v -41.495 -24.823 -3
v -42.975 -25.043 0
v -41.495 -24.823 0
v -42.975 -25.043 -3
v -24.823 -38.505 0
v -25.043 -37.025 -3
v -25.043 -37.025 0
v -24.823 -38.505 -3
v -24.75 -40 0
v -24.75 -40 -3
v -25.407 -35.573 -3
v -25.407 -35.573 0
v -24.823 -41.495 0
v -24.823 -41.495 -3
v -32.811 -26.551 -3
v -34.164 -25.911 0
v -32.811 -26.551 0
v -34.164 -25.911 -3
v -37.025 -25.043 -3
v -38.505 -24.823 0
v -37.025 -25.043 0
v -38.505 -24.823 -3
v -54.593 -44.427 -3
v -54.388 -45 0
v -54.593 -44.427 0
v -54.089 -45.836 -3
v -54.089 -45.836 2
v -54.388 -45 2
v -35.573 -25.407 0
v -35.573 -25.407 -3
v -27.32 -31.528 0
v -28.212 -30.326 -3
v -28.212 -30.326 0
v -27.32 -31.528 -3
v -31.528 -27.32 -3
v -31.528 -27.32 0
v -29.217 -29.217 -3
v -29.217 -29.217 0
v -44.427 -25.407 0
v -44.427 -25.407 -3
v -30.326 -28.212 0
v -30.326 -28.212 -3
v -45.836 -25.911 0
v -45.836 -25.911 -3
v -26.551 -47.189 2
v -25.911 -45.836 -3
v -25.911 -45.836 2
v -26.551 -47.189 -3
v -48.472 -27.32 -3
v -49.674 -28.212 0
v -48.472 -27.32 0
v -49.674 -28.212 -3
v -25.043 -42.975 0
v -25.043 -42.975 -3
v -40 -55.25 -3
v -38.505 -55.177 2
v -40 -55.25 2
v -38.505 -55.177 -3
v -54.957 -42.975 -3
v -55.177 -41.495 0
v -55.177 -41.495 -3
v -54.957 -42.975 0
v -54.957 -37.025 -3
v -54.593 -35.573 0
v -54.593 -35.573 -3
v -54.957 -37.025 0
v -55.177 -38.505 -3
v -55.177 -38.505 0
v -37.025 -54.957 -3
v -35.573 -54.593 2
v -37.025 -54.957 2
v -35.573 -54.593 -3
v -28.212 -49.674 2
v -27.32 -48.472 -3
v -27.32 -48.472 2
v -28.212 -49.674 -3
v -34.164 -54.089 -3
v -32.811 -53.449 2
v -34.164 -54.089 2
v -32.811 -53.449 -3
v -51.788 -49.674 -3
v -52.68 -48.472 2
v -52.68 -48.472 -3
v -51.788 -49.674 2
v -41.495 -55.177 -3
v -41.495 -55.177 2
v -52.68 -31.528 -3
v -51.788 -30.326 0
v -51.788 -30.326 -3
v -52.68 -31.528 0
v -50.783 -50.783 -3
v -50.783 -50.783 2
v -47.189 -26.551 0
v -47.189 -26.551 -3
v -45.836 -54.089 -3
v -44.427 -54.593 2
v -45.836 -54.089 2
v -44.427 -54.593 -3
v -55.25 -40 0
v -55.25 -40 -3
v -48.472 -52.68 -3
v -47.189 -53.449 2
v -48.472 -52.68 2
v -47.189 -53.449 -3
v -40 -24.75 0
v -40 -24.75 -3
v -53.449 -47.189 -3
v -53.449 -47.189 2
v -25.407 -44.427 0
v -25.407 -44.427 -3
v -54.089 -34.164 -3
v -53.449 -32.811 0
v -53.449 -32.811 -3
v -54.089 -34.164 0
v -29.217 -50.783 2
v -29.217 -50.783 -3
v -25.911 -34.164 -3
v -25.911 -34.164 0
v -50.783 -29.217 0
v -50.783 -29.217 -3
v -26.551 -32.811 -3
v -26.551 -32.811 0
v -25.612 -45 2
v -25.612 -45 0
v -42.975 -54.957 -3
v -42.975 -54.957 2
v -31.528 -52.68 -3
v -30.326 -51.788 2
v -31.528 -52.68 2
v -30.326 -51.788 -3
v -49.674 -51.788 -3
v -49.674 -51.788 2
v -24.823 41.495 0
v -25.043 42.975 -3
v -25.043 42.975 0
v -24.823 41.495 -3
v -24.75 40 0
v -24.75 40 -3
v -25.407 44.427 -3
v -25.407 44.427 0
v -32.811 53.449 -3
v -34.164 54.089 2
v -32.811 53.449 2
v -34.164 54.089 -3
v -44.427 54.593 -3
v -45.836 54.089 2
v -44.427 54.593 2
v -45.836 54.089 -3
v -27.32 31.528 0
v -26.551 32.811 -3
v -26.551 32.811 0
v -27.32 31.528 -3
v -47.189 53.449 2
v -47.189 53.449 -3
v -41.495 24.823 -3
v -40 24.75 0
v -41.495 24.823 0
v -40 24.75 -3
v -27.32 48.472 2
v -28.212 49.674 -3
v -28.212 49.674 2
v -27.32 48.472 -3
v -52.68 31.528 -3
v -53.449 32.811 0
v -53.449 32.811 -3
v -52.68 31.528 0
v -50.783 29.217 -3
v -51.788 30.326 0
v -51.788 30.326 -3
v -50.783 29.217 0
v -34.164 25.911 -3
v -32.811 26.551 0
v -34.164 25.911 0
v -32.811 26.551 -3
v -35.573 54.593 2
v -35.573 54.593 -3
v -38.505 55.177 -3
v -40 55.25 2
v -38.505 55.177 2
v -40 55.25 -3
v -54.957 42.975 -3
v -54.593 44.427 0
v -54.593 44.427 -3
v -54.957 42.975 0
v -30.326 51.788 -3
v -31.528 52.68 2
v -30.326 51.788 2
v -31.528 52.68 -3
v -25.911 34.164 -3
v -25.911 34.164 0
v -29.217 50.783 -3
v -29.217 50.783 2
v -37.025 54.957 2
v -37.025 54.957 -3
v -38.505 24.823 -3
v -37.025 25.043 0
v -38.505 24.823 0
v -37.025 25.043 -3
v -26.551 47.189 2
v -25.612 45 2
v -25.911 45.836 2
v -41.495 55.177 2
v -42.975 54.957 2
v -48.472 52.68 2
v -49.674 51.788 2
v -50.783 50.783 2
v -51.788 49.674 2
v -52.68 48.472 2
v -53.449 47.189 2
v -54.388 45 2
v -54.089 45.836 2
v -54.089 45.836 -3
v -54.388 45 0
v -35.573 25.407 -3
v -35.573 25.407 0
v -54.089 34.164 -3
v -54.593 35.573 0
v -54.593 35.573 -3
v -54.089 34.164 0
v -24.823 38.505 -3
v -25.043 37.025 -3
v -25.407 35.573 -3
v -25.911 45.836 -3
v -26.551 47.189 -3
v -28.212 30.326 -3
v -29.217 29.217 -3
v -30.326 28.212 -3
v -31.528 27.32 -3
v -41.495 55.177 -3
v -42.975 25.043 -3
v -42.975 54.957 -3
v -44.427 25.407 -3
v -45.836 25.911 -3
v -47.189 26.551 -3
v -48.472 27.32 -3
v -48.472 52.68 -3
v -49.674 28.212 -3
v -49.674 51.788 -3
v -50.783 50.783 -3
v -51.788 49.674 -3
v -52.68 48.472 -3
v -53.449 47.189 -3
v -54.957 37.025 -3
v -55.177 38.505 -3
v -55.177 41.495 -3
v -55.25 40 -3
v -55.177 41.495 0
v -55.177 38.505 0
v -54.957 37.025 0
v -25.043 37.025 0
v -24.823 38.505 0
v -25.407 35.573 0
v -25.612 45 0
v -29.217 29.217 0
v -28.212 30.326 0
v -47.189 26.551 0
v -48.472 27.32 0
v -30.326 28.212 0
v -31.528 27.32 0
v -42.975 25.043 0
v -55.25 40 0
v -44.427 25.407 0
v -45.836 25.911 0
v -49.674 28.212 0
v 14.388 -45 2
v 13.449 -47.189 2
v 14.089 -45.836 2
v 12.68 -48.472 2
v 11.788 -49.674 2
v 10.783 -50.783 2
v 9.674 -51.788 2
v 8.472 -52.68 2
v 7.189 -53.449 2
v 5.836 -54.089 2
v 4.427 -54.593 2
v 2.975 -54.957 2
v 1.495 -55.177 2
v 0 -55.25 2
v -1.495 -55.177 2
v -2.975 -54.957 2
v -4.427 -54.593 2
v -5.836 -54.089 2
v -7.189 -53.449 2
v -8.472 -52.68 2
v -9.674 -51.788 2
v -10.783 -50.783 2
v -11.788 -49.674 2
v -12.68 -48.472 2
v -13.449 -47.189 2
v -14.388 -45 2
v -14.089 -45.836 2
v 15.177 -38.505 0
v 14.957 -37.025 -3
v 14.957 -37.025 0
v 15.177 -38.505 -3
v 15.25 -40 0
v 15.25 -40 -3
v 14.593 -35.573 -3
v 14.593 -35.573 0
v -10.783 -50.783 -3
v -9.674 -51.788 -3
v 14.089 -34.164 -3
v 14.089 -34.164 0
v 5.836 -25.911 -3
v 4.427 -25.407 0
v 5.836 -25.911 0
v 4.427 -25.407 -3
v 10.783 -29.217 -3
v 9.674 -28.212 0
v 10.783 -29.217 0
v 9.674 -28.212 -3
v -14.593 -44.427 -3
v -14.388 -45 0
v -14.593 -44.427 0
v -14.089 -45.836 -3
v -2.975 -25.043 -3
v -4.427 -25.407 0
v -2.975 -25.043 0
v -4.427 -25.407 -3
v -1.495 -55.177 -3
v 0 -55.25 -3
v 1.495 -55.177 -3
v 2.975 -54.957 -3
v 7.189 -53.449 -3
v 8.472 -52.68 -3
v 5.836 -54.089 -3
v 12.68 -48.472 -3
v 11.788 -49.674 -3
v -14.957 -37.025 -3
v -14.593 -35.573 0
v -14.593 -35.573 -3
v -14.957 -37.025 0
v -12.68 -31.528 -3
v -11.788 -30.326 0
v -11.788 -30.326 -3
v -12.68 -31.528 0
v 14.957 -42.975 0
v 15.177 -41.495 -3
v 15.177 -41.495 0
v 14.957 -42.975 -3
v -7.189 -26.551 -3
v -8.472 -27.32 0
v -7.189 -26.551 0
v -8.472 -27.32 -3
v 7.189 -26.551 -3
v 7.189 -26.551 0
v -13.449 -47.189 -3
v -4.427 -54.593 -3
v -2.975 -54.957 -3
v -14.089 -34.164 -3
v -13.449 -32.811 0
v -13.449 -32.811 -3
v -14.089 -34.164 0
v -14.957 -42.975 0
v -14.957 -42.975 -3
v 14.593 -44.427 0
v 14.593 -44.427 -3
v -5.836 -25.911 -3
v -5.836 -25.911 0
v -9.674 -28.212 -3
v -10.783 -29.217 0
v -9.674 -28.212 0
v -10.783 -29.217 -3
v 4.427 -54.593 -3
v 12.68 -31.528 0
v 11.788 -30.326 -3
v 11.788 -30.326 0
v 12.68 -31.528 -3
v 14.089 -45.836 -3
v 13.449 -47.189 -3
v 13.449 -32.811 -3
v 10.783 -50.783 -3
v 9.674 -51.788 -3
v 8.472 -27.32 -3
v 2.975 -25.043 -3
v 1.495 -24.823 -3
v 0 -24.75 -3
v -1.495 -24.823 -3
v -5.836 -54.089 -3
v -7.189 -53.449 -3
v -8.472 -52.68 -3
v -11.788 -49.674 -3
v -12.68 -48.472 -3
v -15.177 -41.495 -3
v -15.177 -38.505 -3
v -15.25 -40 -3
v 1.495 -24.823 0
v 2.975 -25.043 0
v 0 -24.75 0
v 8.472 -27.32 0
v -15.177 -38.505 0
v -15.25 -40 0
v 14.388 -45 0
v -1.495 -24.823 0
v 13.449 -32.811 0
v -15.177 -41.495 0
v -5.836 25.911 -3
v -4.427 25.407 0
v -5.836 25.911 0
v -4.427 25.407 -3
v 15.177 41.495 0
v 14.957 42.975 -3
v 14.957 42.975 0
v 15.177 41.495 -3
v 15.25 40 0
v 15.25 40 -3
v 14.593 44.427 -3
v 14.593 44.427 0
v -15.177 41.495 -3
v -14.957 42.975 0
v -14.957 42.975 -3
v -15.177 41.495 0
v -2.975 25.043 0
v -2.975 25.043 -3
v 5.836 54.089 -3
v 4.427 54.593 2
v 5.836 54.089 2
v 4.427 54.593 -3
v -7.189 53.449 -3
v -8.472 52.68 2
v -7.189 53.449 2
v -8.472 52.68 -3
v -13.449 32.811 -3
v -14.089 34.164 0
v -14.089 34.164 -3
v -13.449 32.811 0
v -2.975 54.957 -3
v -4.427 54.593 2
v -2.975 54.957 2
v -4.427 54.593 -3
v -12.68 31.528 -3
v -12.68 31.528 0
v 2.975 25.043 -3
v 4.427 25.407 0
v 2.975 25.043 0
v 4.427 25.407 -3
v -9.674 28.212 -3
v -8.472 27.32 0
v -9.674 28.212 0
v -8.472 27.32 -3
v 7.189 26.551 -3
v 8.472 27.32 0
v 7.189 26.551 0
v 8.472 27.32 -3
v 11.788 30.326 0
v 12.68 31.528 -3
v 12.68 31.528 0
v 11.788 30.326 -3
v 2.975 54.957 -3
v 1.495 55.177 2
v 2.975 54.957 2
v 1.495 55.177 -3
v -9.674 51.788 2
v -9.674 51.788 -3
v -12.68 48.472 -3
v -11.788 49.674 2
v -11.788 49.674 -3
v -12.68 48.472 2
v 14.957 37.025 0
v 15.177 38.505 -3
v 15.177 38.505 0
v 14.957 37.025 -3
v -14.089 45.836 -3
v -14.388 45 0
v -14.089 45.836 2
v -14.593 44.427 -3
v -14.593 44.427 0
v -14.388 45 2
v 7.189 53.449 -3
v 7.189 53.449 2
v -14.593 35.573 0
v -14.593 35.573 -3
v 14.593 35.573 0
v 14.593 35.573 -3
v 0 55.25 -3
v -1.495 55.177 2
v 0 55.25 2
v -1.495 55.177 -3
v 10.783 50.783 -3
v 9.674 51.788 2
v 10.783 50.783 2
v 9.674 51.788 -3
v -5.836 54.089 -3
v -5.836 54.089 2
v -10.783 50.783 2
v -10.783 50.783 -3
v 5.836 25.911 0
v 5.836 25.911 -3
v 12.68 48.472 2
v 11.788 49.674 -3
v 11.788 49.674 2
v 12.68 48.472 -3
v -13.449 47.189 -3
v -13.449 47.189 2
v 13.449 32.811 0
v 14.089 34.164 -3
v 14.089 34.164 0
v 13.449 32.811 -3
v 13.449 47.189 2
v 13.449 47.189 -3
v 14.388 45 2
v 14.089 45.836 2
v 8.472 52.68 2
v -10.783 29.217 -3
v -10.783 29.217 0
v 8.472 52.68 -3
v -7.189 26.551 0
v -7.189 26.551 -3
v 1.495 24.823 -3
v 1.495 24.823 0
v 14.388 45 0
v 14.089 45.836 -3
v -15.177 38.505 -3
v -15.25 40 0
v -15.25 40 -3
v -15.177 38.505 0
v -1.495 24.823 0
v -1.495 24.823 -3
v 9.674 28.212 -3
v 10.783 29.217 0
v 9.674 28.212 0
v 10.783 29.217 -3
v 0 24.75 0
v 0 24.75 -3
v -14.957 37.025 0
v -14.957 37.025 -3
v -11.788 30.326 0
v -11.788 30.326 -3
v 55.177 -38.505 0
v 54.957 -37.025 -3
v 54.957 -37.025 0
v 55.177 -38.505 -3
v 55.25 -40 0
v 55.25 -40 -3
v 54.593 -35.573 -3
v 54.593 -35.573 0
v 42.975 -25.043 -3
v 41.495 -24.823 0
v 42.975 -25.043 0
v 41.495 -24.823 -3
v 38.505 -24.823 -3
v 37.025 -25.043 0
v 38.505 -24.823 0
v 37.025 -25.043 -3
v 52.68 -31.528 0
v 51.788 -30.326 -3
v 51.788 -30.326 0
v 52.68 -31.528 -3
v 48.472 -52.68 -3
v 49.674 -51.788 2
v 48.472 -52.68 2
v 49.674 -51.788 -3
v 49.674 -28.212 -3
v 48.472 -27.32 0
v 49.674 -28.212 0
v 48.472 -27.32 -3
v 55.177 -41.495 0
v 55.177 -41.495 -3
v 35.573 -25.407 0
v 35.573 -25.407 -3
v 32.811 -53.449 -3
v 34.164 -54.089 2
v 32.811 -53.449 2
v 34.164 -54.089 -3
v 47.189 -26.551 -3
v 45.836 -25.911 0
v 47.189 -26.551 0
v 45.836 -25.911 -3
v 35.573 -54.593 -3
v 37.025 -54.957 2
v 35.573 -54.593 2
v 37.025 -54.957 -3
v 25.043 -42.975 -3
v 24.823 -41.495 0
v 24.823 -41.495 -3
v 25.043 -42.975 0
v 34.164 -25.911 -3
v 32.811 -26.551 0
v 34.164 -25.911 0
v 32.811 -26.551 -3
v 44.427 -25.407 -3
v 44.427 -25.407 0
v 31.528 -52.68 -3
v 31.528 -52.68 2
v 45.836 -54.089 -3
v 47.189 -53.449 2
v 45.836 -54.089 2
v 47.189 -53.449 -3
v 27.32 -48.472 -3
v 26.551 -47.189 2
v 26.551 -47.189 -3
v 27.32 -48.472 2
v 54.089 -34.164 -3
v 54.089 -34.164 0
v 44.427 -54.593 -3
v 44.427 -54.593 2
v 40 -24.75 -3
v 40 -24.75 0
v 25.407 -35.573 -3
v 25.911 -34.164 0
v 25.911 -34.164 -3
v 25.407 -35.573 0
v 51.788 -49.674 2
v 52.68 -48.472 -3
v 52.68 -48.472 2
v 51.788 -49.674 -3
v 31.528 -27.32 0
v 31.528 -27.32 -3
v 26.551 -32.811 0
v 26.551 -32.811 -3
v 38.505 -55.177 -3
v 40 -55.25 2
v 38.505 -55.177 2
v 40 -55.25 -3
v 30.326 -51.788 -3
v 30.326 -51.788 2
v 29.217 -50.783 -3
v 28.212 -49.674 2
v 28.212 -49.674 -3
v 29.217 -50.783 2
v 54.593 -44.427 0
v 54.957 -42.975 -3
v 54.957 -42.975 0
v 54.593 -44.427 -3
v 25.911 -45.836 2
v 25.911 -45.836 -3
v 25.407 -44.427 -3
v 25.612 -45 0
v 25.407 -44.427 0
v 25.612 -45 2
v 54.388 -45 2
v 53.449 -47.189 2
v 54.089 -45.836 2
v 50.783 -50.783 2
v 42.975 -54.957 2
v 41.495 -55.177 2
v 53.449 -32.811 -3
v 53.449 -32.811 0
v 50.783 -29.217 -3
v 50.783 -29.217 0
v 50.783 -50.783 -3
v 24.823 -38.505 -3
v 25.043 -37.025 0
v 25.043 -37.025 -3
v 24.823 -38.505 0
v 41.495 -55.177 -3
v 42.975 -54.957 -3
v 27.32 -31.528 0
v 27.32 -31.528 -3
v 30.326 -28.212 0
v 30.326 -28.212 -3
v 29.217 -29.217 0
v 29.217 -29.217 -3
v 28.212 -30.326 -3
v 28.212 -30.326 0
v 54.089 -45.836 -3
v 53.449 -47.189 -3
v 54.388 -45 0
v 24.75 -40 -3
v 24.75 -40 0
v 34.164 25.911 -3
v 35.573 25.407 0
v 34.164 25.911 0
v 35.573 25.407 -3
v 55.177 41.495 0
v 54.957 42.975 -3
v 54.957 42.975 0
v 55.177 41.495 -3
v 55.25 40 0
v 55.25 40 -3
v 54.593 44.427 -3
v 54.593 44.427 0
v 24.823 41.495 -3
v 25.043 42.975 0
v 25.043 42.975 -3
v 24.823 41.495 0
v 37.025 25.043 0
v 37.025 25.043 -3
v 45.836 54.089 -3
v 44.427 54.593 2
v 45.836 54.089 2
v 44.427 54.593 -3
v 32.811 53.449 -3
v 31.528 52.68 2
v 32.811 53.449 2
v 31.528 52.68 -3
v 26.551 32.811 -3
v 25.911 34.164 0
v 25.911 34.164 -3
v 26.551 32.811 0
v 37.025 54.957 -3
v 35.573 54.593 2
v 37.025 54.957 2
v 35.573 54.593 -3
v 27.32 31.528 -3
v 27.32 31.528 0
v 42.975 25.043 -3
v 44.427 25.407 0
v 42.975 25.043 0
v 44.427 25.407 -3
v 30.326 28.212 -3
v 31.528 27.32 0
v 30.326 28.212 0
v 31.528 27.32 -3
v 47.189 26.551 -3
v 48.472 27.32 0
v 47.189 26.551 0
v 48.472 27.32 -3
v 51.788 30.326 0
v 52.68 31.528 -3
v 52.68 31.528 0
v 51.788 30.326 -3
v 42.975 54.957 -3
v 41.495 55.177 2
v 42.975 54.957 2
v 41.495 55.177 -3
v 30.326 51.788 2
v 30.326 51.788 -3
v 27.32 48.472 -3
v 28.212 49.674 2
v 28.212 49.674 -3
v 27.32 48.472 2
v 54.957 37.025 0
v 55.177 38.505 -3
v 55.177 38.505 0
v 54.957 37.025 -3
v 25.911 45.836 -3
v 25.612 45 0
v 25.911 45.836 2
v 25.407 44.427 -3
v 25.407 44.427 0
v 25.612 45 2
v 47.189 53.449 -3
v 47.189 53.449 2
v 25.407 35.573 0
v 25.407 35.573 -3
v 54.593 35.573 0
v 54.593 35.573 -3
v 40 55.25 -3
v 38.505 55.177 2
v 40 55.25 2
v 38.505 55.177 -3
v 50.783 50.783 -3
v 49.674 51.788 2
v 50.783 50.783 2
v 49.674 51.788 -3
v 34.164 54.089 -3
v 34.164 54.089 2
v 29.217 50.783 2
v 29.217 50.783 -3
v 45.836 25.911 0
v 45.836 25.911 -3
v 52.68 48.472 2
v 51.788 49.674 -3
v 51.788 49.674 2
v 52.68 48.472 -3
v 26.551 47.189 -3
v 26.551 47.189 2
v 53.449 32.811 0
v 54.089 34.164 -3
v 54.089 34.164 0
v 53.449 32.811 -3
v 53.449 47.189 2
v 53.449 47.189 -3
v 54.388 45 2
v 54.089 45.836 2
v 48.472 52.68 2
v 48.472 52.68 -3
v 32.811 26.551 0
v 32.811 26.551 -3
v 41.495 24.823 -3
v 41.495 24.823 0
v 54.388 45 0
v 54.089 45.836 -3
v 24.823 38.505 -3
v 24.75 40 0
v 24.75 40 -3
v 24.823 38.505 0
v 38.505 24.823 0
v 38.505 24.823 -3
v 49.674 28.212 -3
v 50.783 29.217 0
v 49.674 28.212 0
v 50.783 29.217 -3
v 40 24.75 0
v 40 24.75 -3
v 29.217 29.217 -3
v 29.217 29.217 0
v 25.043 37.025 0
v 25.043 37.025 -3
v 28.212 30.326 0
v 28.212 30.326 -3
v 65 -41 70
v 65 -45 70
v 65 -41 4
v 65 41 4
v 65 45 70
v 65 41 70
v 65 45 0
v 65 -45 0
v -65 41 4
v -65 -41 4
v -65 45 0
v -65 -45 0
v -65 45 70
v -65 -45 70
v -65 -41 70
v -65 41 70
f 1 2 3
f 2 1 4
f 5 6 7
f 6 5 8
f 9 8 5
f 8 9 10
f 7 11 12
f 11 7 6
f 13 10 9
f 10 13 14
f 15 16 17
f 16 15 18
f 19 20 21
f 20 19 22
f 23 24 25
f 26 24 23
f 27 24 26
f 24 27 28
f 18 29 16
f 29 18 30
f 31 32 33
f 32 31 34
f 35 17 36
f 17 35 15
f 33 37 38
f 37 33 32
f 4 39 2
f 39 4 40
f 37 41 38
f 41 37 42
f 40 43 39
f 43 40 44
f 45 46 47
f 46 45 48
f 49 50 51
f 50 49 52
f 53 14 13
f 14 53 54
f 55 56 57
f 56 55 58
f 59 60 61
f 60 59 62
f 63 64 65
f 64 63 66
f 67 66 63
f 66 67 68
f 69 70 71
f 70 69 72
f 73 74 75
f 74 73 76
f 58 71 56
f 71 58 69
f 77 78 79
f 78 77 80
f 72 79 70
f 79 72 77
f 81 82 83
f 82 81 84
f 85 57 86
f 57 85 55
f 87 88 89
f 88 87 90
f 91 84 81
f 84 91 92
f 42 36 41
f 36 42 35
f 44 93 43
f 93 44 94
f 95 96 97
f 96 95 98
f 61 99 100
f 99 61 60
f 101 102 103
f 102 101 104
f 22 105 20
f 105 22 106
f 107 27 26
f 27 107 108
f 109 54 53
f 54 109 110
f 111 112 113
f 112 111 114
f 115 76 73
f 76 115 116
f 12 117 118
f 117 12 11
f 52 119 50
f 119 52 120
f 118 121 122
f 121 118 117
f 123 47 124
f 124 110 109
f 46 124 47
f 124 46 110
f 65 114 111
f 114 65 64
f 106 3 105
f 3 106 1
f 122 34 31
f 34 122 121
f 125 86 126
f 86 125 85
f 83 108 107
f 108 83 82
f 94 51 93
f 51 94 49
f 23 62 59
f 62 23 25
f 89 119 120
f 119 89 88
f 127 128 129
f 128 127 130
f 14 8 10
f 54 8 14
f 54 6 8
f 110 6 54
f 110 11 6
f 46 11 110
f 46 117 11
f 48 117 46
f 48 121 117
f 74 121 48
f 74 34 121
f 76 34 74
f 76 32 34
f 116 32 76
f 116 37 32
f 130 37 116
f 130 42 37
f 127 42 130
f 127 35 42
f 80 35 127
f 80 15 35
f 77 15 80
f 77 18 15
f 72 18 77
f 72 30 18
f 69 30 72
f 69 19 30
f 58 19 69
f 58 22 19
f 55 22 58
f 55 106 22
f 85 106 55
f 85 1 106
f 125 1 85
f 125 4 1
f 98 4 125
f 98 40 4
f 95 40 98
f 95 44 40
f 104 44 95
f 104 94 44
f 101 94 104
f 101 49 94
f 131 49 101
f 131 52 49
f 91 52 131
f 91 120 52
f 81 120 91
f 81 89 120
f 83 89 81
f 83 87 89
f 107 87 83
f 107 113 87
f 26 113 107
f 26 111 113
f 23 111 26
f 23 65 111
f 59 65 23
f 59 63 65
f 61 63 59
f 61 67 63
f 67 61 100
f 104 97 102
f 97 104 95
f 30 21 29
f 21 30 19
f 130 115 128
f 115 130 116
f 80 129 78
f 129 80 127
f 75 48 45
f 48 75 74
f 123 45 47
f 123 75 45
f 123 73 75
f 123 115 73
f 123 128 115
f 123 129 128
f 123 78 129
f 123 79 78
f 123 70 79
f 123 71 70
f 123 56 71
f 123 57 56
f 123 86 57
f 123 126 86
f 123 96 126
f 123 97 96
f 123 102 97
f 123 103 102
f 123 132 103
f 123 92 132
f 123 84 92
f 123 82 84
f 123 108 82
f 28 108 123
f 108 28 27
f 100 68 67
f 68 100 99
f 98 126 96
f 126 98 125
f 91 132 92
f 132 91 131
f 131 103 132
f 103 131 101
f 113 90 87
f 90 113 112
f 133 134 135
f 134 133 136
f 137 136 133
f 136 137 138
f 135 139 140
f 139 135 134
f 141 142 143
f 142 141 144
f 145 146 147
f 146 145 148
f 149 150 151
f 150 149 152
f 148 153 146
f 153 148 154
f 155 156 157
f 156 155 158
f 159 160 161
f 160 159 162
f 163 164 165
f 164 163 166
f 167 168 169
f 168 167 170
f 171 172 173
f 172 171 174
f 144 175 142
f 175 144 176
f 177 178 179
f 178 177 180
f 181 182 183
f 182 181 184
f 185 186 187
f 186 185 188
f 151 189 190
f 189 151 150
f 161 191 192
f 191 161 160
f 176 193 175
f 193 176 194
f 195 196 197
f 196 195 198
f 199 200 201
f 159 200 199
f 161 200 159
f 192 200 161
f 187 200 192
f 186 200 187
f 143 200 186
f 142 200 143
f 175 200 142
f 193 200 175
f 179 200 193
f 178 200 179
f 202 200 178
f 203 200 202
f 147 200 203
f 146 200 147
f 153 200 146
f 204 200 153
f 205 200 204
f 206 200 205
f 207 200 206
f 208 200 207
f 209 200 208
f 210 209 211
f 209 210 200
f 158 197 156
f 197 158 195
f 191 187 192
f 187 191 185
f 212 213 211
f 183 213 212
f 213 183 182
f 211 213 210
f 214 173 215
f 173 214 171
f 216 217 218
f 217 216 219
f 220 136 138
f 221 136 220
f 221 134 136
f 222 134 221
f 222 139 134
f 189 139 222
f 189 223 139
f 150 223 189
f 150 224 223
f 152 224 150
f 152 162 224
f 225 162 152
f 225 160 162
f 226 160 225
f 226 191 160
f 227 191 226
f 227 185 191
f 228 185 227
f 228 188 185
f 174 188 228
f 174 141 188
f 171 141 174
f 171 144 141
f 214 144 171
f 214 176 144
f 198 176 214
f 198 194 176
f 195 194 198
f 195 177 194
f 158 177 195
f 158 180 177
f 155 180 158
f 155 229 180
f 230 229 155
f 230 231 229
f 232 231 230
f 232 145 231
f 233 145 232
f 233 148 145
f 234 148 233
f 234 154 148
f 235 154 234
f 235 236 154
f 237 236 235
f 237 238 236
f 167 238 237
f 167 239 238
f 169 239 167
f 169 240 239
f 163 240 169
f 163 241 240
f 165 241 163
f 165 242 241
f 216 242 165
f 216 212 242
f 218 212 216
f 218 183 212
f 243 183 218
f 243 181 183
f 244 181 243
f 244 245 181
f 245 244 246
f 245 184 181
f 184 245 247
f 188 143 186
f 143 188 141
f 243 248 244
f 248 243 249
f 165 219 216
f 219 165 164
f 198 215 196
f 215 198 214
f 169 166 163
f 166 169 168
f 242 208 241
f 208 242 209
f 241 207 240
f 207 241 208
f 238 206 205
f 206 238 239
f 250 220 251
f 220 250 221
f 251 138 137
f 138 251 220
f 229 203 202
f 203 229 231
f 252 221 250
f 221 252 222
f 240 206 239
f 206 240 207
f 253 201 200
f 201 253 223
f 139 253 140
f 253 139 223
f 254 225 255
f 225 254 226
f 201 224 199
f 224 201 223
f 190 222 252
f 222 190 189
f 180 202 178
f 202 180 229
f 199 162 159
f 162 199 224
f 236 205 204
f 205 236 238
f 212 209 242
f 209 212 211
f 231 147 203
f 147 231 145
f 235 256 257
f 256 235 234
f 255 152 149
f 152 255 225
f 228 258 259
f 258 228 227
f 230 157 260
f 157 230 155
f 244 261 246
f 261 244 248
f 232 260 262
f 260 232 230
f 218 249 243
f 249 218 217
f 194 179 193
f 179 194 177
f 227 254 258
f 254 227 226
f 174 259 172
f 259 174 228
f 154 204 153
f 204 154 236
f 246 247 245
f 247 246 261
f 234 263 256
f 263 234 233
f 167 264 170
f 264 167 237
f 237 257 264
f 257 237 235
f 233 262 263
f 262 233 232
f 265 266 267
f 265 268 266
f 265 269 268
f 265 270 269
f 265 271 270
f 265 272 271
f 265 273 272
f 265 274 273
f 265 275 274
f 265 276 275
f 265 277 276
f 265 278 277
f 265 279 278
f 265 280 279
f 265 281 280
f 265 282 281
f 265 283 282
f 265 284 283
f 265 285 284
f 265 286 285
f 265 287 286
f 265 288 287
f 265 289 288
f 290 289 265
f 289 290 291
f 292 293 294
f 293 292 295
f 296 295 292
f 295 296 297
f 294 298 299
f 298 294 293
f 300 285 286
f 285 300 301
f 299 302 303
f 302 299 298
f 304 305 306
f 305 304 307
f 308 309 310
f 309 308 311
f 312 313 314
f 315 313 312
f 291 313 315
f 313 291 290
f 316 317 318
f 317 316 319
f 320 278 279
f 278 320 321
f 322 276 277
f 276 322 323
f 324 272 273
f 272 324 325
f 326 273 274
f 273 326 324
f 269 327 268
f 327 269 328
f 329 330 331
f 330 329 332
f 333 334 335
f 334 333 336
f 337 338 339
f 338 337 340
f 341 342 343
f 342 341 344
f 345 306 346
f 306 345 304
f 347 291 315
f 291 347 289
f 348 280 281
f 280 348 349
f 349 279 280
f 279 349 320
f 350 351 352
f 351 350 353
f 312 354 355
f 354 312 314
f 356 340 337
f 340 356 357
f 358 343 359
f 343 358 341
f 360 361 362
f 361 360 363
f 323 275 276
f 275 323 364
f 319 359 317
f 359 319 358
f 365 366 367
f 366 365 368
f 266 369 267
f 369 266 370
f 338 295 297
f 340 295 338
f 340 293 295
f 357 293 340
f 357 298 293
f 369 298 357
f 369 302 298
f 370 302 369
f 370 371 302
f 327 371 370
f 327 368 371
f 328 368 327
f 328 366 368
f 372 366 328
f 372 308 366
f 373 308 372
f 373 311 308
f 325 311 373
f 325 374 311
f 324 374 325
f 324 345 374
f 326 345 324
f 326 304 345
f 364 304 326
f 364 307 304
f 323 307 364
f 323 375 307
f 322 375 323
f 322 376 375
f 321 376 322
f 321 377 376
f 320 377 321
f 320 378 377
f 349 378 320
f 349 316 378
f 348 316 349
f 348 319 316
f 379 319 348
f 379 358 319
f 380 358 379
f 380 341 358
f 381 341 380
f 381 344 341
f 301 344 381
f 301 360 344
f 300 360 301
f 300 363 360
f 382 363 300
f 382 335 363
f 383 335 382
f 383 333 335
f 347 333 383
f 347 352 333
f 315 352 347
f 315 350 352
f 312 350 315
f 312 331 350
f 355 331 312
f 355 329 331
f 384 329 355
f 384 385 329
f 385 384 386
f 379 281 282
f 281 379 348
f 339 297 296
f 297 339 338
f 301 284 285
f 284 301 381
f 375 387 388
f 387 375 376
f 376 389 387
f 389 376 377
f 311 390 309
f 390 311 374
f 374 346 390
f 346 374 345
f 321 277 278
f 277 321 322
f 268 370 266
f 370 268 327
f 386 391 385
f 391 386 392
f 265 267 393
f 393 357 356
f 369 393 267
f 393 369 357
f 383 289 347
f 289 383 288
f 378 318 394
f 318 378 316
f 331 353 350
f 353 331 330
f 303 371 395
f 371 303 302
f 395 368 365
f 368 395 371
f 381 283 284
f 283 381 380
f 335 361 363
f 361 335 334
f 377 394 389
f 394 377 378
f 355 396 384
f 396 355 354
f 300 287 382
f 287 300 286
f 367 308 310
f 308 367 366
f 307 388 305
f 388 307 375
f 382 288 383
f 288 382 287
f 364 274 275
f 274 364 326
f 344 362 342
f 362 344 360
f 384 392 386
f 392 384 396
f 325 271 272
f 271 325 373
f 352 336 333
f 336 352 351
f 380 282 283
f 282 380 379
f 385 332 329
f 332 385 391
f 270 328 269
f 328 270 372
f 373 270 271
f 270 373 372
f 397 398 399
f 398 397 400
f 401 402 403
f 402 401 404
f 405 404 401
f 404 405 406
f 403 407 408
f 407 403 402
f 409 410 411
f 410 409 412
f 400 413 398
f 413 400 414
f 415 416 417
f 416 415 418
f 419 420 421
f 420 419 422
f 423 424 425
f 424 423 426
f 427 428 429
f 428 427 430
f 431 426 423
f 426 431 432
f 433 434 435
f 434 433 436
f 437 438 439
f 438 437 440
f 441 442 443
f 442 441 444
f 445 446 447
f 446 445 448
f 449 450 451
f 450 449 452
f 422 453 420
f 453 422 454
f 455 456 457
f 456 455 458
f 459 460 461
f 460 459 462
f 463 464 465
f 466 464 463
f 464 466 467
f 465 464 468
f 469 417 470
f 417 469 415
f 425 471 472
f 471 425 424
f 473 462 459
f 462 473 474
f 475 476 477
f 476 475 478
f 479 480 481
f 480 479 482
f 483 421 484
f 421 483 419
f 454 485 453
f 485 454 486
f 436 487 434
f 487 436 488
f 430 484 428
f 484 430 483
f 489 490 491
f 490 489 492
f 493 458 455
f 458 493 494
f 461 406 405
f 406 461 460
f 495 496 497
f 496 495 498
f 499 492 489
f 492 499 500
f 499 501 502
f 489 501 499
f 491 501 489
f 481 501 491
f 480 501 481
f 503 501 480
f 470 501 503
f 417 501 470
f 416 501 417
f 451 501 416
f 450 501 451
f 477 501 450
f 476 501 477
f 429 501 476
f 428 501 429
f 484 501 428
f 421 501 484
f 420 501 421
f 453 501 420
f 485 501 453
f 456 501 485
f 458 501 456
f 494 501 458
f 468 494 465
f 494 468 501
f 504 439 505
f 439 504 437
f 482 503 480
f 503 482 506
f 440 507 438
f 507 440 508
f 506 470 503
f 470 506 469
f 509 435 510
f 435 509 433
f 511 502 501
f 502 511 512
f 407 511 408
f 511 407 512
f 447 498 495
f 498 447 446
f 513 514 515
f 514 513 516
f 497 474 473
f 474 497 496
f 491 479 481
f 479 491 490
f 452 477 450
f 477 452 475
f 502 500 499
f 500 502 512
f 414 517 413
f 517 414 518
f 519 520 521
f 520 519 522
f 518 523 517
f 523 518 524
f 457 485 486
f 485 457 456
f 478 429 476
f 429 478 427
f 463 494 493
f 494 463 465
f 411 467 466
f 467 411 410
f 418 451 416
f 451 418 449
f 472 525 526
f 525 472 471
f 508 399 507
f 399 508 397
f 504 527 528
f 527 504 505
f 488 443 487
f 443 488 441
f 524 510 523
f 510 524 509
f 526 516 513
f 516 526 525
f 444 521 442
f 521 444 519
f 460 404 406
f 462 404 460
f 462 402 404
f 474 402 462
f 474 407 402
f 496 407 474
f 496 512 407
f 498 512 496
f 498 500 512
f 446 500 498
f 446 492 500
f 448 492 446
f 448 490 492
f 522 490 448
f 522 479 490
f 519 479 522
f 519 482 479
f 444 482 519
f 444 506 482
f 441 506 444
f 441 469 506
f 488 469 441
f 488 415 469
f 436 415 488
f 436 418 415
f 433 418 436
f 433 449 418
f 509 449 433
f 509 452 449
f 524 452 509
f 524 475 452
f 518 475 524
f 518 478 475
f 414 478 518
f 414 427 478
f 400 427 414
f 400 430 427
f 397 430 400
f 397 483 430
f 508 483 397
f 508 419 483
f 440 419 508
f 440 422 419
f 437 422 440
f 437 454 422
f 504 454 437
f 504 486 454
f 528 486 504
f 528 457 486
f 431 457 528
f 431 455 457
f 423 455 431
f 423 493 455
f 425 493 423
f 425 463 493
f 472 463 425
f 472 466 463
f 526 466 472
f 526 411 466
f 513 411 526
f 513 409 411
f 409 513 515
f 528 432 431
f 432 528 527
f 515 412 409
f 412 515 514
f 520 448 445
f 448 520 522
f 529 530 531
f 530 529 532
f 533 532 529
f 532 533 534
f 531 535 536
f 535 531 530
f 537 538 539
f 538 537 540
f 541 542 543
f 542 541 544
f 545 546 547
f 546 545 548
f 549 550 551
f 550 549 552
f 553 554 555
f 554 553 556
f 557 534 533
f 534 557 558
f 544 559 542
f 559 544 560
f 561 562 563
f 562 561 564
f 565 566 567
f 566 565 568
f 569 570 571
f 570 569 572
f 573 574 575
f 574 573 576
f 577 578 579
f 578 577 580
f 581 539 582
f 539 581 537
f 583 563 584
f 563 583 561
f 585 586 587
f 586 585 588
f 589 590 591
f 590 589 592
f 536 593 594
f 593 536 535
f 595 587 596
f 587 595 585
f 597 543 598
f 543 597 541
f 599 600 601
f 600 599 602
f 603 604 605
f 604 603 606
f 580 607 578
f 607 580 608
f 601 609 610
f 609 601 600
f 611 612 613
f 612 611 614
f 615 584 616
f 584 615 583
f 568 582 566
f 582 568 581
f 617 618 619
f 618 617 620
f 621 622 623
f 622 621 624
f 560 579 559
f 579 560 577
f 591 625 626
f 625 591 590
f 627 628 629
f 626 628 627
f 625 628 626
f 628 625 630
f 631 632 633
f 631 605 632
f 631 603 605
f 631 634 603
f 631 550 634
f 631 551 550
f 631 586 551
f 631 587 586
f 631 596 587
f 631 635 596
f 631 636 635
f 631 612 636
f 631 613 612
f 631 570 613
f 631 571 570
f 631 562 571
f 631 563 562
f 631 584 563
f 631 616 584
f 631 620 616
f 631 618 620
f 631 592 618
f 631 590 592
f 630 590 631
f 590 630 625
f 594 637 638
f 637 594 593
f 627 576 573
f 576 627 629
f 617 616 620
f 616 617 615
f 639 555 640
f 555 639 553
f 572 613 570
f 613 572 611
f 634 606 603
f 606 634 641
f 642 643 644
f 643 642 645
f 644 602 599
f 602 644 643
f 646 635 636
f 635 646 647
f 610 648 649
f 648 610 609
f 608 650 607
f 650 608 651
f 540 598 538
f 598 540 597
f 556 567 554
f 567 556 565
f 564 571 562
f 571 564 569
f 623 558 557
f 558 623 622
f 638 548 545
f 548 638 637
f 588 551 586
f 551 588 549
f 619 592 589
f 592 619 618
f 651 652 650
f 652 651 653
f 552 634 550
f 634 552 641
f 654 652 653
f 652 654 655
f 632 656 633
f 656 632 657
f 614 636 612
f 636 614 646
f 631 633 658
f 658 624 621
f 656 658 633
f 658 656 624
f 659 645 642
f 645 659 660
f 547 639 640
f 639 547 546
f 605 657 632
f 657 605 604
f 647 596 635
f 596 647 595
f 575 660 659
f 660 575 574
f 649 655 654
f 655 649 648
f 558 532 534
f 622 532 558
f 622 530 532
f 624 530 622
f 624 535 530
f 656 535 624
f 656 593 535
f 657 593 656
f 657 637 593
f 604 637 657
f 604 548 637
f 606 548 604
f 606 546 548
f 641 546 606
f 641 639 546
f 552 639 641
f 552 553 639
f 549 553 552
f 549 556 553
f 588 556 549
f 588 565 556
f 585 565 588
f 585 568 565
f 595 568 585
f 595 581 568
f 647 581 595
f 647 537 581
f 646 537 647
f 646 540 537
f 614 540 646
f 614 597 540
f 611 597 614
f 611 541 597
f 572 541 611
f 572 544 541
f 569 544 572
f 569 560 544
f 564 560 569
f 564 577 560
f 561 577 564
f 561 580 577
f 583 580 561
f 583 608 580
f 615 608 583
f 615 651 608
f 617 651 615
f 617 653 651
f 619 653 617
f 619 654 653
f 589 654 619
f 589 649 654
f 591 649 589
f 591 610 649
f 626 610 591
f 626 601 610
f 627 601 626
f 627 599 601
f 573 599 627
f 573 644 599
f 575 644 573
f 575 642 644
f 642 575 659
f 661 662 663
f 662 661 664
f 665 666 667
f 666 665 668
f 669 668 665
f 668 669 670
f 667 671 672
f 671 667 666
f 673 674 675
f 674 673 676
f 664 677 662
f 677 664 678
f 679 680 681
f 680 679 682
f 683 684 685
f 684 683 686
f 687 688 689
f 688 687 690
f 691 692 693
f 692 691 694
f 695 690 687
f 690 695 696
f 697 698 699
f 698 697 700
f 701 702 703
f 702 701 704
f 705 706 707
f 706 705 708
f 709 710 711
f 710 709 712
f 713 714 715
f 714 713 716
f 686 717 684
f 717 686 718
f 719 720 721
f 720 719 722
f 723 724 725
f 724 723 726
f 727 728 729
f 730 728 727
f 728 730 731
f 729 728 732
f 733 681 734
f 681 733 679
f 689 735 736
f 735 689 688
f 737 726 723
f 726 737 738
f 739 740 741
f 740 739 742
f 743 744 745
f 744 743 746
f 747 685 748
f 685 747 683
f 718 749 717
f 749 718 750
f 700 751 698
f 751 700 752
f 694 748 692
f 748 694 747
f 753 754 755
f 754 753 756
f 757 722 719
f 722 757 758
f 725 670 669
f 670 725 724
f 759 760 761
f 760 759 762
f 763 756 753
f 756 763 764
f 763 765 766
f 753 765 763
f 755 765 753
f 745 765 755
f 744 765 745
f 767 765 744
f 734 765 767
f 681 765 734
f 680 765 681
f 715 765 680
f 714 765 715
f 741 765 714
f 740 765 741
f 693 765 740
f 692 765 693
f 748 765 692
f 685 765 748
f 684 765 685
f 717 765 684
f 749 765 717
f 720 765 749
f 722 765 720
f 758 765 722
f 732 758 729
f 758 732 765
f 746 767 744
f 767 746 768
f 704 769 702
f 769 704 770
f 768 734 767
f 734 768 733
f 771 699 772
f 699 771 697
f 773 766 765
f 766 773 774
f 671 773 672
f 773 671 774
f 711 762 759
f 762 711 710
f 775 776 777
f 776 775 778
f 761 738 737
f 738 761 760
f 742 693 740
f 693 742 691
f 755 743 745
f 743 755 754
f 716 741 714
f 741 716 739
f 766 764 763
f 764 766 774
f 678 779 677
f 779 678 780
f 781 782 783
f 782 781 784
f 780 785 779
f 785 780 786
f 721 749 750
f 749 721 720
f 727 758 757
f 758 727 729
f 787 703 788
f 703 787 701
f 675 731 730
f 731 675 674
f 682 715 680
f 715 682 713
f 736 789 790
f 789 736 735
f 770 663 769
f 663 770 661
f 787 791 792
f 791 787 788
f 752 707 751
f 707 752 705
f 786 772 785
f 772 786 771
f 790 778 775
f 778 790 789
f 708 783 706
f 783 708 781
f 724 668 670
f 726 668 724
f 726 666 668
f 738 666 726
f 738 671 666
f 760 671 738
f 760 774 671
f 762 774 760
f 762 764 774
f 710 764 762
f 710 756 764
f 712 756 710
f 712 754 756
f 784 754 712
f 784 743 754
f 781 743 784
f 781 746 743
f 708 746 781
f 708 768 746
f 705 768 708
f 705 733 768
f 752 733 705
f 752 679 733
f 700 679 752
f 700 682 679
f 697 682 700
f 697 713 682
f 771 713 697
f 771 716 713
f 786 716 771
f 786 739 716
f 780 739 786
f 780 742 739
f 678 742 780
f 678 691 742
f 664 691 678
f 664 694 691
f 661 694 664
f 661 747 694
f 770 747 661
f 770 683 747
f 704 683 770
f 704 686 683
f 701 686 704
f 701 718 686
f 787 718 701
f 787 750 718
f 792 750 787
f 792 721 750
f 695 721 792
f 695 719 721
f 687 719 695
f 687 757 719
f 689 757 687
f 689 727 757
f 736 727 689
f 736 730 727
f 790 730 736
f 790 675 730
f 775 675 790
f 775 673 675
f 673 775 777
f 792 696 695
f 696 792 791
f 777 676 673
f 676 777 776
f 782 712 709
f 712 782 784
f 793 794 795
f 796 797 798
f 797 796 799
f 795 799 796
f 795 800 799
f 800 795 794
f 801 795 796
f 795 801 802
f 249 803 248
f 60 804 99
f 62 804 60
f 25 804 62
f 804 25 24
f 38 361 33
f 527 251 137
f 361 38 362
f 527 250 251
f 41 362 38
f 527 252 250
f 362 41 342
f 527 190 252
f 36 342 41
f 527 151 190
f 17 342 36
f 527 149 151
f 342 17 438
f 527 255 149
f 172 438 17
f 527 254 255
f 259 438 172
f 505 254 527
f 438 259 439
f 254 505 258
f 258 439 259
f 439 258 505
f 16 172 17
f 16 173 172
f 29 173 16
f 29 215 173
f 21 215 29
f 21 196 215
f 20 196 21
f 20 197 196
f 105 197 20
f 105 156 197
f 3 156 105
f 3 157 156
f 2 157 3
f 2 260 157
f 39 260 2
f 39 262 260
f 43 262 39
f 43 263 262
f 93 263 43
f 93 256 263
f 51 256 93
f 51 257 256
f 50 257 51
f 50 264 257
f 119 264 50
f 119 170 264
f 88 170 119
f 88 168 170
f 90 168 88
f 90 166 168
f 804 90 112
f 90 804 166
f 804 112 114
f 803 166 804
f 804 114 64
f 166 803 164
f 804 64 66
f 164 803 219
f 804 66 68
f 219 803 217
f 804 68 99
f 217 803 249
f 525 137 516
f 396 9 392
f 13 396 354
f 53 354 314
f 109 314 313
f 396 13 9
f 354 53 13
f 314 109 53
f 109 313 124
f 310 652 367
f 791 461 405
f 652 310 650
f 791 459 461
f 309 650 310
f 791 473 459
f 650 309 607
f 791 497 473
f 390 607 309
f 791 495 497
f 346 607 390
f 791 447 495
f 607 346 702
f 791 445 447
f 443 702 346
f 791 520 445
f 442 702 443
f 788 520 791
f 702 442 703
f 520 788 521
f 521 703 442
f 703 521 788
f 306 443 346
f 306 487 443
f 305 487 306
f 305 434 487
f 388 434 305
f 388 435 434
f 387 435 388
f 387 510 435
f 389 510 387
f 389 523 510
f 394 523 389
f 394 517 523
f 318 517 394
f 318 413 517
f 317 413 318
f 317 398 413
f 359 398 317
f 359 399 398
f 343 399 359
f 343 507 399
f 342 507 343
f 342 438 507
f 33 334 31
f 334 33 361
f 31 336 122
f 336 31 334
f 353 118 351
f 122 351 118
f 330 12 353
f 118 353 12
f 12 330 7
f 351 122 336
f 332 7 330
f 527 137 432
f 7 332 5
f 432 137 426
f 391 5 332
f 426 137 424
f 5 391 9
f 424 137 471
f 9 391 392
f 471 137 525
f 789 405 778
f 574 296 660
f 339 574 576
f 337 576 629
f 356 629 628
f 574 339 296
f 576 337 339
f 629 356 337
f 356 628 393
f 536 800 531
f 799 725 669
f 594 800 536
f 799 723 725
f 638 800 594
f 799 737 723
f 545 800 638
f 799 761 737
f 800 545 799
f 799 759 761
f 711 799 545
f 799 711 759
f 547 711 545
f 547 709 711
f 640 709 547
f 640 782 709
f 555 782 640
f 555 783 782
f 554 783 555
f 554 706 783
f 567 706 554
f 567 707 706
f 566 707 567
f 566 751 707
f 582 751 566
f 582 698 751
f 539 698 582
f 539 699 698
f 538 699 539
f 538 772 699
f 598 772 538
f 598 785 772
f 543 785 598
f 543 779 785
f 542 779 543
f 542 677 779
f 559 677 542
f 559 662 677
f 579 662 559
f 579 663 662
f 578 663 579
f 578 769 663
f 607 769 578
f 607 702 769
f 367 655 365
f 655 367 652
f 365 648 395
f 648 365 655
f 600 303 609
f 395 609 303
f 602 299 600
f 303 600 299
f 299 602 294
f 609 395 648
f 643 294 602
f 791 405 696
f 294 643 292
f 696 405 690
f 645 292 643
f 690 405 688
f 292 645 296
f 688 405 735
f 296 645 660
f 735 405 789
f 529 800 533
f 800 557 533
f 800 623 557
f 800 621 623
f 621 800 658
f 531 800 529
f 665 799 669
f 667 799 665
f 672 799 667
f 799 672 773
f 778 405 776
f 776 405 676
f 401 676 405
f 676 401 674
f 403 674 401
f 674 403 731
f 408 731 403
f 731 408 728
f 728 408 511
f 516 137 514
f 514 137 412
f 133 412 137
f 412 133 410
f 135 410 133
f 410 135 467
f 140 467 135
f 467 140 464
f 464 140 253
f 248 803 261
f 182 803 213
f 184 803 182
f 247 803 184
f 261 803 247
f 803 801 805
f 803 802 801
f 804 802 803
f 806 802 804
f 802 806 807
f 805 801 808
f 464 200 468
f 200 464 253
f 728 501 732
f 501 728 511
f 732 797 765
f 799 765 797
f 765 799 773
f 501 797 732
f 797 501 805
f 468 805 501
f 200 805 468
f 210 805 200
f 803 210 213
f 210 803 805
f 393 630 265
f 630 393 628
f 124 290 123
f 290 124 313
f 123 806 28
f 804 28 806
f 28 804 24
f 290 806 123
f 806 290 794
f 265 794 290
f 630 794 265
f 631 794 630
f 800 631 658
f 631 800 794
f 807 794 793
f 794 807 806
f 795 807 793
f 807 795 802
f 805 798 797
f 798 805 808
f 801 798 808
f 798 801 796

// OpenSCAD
// Dimensions (mm)
plate_x = 130;
plate_y = 90;
plate_z = 4;

hole_dia = 30.5;
hole_r = hole_dia / 2;

// Grid layout
hole_spacing_x = 40;
hole_spacing_y = 40;

// Walls
wall_height = 70;
wall_thickness = 4;

// Quality
$fn = 64;

// Main plate
translate([-plate_x/2, -plate_y/2, 0])
    cube([plate_x, plate_y, plate_z]);

// Walls along the long edges (Y direction edges, i.e., at y = -plate_y/2 and y = plate_y/2)
// Left wall (at y = -plate_y/2)
translate([-plate_x/2, -plate_y/2, 0])
    cube([plate_x, wall_thickness, wall_height]);

// Right wall (at y = plate_y/2 - wall_thickness to be flush with edge)
translate([-plate_x/2, plate_y/2 - wall_thickness, 0])
    cube([plate_x, wall_thickness, wall_height]);

// Holes: 2 rows (Y) x 3 columns (X)
// Centred on plate
// X positions: -40, 0, +40
// Y positions: -20, +20
for (xi = [-1, 0, 1]) {
    for (yi = [-1, 1]) {
        translate([xi * hole_spacing_x, yi * hole_spacing_y, -0.5])
            cylinder(r = hole_r, h = plate_z + 1, center = true);
    }
}
